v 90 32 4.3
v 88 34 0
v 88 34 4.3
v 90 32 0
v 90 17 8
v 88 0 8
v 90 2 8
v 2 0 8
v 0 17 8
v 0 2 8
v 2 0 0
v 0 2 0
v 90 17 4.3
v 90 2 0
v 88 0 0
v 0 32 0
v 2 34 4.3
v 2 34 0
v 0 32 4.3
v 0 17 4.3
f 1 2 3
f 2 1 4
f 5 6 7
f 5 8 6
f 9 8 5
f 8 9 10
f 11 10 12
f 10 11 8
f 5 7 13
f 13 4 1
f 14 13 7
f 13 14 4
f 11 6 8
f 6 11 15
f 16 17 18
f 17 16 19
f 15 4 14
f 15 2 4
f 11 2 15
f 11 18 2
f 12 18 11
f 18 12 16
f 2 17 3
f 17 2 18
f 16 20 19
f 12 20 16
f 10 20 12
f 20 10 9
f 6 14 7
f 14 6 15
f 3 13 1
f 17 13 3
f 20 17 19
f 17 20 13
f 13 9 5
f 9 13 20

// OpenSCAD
$fn = 32;

// ----------------------------------------------------------------------
// Stepped bar: sidestep, 90 x 34 x 8/4.3 mm
// ----------------------------------------------------------------------

// --- parameters (mm) ---
bar_l = 90;               // bar length, X
bar_w = 34;               // bar width, Y
plate_t = 8;              // thickness of the thick zone, Z
thin_t = 4.3;             // thickness of the thin zone
corner_c = 2;             // corner chamfer of the bar
step_cut = 3.7;           // material removed from the thin zone
ledge_y = 17;             // start of the ledge from the front edge
depth_1 = 3.7;            // depth of cut 1 from the top face

profile = [[2, 0], [88, 0], [90, 2], [90, 32], [88, 34], [2, 34], [0, 32], [0, 2]];  // primary outline, 8 points, counter clockwise
void_1 = [[-1, 17], [91, 17], [91, 35], [-1, 35]];  // ledge cut along one edge, 4 points

// --- the one profile operation ---
difference() {
  linear_extrude(height = plate_t) polygon(points = profile);
  translate([0, 0, plate_t - depth_1])
    linear_extrude(height = depth_1 + 1) polygon(points = void_1);
}
